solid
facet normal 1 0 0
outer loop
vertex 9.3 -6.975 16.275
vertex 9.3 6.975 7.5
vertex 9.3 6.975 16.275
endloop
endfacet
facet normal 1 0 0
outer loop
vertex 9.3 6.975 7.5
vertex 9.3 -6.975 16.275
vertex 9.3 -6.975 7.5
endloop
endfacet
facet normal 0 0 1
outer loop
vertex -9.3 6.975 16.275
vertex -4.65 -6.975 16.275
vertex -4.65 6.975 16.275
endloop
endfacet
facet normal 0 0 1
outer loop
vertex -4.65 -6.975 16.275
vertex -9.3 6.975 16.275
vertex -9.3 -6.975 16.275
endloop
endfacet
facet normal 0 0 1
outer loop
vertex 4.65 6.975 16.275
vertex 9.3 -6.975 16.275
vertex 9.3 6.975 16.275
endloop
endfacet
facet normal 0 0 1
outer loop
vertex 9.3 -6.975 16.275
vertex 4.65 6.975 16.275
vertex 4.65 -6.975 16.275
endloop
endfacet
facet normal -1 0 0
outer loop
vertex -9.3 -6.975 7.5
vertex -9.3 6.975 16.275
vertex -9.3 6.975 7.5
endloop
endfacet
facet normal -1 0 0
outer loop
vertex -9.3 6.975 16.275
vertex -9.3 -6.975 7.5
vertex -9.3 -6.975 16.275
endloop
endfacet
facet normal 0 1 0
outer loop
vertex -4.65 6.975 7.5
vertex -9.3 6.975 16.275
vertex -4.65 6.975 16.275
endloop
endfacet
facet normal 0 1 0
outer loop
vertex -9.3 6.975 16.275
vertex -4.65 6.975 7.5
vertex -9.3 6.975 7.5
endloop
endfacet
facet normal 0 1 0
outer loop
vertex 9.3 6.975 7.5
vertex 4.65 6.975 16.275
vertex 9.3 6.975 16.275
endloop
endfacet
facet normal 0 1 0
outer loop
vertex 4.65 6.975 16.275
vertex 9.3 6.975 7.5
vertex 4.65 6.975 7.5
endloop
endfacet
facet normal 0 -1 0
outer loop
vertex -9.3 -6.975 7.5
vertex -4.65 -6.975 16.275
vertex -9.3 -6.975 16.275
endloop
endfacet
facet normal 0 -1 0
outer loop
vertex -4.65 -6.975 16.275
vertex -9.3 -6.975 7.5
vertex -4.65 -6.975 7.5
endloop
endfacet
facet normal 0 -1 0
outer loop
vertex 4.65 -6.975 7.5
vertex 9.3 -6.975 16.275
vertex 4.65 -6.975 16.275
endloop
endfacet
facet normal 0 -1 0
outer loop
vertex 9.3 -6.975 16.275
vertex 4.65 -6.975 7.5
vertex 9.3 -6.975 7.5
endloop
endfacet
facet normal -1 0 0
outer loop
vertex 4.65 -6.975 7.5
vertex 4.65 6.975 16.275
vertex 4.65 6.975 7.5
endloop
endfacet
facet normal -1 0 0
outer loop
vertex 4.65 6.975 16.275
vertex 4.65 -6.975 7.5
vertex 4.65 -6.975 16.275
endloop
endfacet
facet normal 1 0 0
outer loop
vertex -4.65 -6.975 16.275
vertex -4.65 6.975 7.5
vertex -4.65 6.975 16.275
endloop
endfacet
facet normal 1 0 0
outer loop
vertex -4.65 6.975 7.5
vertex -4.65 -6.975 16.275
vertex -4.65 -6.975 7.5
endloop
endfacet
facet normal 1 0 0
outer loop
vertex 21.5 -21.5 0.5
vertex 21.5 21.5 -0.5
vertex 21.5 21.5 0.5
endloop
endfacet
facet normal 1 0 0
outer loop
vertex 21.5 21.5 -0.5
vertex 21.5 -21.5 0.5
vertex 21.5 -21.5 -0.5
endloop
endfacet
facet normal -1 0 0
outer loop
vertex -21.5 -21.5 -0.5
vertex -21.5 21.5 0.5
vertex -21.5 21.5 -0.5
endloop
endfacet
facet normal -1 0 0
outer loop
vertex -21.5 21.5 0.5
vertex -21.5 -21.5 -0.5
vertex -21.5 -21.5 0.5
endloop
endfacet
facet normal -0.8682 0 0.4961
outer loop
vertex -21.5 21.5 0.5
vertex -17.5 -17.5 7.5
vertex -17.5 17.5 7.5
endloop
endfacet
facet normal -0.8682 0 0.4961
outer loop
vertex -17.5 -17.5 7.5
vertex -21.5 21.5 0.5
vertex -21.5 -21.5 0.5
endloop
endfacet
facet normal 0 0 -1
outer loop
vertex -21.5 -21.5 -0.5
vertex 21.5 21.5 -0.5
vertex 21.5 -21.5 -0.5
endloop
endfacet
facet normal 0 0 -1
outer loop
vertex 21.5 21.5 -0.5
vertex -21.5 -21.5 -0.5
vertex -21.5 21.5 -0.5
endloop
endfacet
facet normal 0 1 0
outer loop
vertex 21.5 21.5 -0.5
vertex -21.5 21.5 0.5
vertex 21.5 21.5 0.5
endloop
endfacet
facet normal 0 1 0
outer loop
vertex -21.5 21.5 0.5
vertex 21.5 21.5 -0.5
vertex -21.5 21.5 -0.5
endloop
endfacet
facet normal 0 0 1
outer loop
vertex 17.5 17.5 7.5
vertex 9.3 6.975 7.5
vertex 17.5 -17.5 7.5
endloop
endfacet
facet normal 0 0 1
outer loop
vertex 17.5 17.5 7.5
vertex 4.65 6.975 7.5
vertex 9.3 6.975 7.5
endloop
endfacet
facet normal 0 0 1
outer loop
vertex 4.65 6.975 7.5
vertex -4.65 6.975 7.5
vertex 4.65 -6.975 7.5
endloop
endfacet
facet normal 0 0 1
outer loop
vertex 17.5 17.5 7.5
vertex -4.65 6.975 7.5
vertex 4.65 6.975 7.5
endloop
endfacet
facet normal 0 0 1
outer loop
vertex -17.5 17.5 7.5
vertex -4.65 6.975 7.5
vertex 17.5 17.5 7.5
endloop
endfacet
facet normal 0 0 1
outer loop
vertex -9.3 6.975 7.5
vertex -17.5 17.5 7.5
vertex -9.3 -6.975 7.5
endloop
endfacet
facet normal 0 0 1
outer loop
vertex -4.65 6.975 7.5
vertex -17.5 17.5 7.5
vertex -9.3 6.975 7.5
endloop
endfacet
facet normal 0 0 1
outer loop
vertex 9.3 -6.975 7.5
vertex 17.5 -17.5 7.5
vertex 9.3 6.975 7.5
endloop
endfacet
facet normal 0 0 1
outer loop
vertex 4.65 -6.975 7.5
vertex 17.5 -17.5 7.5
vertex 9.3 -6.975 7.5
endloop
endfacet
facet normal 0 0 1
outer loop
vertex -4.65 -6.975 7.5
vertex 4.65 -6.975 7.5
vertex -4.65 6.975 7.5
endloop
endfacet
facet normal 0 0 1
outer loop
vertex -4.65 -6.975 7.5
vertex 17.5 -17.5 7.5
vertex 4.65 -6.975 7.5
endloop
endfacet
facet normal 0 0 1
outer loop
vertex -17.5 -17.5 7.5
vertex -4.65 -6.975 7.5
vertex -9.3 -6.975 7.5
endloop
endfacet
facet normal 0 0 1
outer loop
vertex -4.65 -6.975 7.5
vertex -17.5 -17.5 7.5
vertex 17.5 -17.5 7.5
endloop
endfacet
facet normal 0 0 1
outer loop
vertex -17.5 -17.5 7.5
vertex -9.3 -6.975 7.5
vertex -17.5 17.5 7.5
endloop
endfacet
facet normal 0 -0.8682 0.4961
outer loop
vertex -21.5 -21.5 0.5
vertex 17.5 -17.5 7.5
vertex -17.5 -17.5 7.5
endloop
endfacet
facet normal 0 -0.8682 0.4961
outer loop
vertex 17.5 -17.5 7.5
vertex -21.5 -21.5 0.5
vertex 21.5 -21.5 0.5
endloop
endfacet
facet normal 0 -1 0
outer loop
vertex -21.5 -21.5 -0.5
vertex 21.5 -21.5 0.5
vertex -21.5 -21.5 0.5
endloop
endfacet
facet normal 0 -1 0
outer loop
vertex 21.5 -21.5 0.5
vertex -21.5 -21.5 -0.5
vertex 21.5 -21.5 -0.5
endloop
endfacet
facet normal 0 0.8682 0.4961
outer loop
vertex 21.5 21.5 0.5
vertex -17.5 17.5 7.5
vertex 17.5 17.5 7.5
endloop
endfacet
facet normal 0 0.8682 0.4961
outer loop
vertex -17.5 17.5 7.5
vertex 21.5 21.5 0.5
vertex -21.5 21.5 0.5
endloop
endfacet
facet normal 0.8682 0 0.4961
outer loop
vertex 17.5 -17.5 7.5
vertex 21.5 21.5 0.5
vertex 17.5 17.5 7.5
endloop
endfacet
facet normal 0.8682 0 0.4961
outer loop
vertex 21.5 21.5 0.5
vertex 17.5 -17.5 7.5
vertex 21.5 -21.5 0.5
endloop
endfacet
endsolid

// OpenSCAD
IPHONE_WIDTH = 9.3;

module base() {
	hull() {
		cube(size = [43,43,1], center = true);
 		translate([0,0,7]) cube(size = [35,35,1], center = true);
	}
}

module holder(width) {
	difference() {
		cube(size= [width * 2, width * 1.5, width * 1.5], center = true);
		cube(size = [width, width * 2, width * 1.5], center = true);
	}
}

base();
translate ([0,0,IPHONE_WIDTH]) holder(IPHONE_WIDTH);
